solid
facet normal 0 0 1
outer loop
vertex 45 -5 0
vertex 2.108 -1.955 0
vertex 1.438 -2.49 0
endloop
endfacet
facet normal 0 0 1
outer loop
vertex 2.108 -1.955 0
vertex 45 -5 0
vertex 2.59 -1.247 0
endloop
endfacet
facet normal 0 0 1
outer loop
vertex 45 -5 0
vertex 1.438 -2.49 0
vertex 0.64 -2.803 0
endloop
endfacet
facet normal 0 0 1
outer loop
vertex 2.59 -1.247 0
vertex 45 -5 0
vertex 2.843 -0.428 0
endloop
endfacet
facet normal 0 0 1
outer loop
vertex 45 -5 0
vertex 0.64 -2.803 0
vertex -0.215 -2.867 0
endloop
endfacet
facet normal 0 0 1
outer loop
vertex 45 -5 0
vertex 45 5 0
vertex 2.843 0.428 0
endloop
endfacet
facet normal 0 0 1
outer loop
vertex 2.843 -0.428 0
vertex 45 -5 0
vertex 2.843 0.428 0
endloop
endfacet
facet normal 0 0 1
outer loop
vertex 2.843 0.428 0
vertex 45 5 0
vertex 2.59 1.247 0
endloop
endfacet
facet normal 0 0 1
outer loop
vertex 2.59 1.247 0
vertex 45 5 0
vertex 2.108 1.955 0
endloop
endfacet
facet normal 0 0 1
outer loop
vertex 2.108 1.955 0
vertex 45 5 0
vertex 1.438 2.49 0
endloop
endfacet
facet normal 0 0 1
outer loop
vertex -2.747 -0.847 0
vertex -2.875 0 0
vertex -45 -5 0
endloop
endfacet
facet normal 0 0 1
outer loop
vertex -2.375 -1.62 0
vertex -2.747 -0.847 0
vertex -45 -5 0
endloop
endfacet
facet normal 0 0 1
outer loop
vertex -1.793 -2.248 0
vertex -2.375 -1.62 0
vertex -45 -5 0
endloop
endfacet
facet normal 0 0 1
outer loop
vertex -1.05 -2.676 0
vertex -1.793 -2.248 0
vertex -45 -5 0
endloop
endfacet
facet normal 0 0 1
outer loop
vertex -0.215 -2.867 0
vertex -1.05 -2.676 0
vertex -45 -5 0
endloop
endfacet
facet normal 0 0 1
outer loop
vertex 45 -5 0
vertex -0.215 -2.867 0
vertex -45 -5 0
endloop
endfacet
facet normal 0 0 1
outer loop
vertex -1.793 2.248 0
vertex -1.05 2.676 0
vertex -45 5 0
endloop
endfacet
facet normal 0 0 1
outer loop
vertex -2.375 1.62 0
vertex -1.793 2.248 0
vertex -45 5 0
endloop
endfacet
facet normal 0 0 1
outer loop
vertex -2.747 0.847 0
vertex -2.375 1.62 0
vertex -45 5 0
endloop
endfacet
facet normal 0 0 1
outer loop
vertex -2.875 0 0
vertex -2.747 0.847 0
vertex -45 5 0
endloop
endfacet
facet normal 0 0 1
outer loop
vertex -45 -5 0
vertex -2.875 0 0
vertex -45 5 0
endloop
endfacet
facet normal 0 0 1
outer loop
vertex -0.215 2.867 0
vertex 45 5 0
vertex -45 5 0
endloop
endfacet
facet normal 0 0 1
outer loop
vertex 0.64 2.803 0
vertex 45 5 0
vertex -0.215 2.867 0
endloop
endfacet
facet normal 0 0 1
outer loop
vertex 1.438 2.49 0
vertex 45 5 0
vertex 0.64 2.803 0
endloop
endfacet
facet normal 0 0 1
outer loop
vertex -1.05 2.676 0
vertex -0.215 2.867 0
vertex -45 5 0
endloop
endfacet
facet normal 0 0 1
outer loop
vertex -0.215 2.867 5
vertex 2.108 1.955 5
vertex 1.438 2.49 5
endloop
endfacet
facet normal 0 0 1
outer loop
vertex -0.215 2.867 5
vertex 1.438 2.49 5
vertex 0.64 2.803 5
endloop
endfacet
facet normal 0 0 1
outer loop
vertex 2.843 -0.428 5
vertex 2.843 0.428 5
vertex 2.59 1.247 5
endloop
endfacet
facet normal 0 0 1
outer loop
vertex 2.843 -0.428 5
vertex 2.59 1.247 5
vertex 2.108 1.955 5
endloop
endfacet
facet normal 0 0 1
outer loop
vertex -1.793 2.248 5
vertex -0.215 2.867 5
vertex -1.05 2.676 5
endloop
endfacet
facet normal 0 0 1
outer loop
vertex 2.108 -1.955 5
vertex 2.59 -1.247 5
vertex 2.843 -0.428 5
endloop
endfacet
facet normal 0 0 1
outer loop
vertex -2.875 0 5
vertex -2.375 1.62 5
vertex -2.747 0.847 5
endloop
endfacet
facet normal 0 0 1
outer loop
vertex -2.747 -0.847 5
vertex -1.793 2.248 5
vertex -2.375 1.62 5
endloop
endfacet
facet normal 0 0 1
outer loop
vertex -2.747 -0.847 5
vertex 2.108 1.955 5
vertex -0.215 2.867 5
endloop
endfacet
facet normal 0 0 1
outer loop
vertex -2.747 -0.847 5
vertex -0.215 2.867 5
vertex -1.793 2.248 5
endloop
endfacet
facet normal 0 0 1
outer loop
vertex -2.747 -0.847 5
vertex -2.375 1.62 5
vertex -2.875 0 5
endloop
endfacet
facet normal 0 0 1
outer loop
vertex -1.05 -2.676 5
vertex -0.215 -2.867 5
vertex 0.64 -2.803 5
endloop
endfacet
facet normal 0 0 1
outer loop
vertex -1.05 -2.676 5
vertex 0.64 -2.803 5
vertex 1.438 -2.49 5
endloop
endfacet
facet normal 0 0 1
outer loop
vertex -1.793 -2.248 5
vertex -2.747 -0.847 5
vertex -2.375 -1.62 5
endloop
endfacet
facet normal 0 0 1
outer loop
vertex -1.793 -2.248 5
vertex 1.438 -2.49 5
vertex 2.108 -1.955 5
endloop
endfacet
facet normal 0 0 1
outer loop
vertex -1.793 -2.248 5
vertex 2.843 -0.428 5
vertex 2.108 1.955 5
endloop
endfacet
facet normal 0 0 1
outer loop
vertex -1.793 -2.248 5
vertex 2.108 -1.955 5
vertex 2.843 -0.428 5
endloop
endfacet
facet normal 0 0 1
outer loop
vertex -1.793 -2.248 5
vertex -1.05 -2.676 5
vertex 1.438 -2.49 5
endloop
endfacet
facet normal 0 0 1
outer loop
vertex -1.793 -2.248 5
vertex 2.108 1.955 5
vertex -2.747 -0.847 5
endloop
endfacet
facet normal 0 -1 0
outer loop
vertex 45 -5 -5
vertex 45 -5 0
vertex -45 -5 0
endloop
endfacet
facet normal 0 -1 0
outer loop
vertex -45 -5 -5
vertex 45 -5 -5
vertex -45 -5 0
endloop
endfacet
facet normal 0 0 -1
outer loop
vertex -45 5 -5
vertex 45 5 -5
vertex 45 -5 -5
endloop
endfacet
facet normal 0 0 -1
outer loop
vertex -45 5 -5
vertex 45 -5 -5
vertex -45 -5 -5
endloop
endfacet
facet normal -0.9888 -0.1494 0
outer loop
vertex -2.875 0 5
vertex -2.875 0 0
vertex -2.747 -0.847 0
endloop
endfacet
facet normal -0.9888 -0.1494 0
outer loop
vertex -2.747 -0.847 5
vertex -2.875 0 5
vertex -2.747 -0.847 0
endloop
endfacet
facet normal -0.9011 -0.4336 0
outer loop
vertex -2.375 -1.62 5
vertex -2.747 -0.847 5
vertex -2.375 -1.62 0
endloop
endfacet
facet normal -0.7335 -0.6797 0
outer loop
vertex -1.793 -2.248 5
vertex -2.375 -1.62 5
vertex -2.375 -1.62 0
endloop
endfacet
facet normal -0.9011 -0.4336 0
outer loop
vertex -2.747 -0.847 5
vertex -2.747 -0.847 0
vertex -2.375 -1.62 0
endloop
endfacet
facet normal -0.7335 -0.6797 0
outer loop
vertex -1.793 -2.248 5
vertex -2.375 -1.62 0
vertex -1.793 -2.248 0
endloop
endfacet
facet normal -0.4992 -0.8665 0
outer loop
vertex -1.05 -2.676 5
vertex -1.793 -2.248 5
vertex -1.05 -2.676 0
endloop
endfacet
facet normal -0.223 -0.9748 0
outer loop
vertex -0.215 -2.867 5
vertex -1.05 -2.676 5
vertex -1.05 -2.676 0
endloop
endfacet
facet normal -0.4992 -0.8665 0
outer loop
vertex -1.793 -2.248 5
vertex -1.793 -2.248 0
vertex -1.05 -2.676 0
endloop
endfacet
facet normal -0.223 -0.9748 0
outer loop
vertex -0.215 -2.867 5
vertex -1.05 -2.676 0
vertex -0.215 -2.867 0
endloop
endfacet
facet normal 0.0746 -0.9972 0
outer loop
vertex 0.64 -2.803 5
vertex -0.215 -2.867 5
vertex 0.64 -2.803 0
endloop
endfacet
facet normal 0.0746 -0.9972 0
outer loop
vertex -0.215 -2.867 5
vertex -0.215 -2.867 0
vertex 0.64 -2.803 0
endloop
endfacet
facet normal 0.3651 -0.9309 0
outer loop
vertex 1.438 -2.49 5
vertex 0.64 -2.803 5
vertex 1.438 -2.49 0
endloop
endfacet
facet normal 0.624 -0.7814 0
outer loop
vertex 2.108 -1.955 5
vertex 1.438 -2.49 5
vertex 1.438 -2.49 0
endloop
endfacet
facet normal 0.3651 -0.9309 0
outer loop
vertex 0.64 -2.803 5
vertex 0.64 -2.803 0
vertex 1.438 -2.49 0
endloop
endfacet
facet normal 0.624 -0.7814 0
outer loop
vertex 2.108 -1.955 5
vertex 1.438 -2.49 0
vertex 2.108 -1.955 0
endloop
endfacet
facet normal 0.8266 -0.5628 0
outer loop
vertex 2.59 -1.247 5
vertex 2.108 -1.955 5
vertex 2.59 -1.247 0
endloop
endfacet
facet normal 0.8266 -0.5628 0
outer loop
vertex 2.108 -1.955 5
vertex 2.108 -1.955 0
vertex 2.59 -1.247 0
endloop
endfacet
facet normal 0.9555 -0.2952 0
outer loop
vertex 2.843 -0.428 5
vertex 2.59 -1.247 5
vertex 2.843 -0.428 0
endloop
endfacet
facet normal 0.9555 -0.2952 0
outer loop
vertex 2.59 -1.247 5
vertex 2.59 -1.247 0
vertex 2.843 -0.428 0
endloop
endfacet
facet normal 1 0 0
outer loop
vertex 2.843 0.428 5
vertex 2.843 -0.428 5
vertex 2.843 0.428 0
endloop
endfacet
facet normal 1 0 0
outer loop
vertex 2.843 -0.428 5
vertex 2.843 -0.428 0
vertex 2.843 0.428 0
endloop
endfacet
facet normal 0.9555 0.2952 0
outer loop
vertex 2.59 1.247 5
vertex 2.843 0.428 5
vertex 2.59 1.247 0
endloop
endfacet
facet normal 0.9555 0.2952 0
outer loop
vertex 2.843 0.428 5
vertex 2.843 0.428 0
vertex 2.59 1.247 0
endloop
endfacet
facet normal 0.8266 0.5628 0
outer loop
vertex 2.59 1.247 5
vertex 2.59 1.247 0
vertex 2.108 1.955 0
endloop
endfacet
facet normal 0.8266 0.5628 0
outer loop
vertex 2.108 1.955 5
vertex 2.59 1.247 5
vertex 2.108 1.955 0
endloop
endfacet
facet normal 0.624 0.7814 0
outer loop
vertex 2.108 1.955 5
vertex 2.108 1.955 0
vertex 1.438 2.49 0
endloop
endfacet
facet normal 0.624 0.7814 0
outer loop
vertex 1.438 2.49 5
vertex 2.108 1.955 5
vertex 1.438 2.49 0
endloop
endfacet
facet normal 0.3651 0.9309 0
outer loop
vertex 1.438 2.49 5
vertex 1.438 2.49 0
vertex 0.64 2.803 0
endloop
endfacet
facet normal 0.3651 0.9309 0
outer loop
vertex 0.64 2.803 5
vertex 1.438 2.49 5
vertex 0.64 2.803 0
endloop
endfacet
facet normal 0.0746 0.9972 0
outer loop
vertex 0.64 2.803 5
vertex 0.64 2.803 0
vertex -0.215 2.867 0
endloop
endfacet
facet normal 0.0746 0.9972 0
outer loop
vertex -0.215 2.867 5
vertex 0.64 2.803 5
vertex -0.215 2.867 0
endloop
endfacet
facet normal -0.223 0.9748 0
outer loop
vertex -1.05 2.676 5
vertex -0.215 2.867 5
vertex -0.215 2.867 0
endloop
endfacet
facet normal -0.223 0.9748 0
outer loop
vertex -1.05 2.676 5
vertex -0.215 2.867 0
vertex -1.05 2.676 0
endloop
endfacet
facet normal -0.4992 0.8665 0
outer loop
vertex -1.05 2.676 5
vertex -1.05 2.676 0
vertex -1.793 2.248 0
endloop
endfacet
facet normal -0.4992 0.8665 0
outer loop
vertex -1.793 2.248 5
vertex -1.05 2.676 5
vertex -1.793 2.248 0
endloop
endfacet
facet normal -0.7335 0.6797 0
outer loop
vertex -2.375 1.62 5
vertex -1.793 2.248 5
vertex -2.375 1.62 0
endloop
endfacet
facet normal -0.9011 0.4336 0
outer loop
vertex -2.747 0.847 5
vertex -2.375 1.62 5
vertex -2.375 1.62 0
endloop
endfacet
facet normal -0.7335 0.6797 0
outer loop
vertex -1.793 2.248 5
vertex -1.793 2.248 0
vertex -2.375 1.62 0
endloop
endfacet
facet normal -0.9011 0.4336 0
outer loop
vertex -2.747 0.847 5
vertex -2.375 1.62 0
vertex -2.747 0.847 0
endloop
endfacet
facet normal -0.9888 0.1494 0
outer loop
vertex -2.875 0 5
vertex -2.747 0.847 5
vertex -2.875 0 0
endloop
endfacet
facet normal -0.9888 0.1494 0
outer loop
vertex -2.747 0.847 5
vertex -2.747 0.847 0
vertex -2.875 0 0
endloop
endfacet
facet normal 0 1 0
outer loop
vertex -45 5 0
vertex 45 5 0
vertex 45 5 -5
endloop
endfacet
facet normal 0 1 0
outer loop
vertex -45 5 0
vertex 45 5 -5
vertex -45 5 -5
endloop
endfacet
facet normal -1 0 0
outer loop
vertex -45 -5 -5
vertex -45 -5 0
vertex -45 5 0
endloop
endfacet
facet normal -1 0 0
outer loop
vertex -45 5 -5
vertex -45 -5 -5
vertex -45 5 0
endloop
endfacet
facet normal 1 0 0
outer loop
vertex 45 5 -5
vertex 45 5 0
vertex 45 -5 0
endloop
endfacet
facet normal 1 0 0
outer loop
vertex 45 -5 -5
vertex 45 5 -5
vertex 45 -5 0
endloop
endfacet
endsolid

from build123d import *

# Parameters (mm, degrees)
BOSS_EXTRUDE2_DEPTH = 5
SKETCH2_R           = 2.875
BOSS_EXTRUDE3_DEPTH = 5


with BuildPart() as part:
    # Sketch1 → Boss-Extrude2 (new body)
    with BuildSketch(Plane.XY):
        Polygon((0, 5), (45, 5), (45, -5), (-45, -5), (-45, 5), align=None)
    extrude(amount=-BOSS_EXTRUDE2_DEPTH)

    # Sketch2 → Boss-Extrude3 (add)
    with BuildSketch(Plane.XY):
        with Locations(Location((0, 0, 0), (0, 0, 180))):
            Circle(SKETCH2_R)
    extrude(amount=BOSS_EXTRUDE3_DEPTH)


solid = part.part
